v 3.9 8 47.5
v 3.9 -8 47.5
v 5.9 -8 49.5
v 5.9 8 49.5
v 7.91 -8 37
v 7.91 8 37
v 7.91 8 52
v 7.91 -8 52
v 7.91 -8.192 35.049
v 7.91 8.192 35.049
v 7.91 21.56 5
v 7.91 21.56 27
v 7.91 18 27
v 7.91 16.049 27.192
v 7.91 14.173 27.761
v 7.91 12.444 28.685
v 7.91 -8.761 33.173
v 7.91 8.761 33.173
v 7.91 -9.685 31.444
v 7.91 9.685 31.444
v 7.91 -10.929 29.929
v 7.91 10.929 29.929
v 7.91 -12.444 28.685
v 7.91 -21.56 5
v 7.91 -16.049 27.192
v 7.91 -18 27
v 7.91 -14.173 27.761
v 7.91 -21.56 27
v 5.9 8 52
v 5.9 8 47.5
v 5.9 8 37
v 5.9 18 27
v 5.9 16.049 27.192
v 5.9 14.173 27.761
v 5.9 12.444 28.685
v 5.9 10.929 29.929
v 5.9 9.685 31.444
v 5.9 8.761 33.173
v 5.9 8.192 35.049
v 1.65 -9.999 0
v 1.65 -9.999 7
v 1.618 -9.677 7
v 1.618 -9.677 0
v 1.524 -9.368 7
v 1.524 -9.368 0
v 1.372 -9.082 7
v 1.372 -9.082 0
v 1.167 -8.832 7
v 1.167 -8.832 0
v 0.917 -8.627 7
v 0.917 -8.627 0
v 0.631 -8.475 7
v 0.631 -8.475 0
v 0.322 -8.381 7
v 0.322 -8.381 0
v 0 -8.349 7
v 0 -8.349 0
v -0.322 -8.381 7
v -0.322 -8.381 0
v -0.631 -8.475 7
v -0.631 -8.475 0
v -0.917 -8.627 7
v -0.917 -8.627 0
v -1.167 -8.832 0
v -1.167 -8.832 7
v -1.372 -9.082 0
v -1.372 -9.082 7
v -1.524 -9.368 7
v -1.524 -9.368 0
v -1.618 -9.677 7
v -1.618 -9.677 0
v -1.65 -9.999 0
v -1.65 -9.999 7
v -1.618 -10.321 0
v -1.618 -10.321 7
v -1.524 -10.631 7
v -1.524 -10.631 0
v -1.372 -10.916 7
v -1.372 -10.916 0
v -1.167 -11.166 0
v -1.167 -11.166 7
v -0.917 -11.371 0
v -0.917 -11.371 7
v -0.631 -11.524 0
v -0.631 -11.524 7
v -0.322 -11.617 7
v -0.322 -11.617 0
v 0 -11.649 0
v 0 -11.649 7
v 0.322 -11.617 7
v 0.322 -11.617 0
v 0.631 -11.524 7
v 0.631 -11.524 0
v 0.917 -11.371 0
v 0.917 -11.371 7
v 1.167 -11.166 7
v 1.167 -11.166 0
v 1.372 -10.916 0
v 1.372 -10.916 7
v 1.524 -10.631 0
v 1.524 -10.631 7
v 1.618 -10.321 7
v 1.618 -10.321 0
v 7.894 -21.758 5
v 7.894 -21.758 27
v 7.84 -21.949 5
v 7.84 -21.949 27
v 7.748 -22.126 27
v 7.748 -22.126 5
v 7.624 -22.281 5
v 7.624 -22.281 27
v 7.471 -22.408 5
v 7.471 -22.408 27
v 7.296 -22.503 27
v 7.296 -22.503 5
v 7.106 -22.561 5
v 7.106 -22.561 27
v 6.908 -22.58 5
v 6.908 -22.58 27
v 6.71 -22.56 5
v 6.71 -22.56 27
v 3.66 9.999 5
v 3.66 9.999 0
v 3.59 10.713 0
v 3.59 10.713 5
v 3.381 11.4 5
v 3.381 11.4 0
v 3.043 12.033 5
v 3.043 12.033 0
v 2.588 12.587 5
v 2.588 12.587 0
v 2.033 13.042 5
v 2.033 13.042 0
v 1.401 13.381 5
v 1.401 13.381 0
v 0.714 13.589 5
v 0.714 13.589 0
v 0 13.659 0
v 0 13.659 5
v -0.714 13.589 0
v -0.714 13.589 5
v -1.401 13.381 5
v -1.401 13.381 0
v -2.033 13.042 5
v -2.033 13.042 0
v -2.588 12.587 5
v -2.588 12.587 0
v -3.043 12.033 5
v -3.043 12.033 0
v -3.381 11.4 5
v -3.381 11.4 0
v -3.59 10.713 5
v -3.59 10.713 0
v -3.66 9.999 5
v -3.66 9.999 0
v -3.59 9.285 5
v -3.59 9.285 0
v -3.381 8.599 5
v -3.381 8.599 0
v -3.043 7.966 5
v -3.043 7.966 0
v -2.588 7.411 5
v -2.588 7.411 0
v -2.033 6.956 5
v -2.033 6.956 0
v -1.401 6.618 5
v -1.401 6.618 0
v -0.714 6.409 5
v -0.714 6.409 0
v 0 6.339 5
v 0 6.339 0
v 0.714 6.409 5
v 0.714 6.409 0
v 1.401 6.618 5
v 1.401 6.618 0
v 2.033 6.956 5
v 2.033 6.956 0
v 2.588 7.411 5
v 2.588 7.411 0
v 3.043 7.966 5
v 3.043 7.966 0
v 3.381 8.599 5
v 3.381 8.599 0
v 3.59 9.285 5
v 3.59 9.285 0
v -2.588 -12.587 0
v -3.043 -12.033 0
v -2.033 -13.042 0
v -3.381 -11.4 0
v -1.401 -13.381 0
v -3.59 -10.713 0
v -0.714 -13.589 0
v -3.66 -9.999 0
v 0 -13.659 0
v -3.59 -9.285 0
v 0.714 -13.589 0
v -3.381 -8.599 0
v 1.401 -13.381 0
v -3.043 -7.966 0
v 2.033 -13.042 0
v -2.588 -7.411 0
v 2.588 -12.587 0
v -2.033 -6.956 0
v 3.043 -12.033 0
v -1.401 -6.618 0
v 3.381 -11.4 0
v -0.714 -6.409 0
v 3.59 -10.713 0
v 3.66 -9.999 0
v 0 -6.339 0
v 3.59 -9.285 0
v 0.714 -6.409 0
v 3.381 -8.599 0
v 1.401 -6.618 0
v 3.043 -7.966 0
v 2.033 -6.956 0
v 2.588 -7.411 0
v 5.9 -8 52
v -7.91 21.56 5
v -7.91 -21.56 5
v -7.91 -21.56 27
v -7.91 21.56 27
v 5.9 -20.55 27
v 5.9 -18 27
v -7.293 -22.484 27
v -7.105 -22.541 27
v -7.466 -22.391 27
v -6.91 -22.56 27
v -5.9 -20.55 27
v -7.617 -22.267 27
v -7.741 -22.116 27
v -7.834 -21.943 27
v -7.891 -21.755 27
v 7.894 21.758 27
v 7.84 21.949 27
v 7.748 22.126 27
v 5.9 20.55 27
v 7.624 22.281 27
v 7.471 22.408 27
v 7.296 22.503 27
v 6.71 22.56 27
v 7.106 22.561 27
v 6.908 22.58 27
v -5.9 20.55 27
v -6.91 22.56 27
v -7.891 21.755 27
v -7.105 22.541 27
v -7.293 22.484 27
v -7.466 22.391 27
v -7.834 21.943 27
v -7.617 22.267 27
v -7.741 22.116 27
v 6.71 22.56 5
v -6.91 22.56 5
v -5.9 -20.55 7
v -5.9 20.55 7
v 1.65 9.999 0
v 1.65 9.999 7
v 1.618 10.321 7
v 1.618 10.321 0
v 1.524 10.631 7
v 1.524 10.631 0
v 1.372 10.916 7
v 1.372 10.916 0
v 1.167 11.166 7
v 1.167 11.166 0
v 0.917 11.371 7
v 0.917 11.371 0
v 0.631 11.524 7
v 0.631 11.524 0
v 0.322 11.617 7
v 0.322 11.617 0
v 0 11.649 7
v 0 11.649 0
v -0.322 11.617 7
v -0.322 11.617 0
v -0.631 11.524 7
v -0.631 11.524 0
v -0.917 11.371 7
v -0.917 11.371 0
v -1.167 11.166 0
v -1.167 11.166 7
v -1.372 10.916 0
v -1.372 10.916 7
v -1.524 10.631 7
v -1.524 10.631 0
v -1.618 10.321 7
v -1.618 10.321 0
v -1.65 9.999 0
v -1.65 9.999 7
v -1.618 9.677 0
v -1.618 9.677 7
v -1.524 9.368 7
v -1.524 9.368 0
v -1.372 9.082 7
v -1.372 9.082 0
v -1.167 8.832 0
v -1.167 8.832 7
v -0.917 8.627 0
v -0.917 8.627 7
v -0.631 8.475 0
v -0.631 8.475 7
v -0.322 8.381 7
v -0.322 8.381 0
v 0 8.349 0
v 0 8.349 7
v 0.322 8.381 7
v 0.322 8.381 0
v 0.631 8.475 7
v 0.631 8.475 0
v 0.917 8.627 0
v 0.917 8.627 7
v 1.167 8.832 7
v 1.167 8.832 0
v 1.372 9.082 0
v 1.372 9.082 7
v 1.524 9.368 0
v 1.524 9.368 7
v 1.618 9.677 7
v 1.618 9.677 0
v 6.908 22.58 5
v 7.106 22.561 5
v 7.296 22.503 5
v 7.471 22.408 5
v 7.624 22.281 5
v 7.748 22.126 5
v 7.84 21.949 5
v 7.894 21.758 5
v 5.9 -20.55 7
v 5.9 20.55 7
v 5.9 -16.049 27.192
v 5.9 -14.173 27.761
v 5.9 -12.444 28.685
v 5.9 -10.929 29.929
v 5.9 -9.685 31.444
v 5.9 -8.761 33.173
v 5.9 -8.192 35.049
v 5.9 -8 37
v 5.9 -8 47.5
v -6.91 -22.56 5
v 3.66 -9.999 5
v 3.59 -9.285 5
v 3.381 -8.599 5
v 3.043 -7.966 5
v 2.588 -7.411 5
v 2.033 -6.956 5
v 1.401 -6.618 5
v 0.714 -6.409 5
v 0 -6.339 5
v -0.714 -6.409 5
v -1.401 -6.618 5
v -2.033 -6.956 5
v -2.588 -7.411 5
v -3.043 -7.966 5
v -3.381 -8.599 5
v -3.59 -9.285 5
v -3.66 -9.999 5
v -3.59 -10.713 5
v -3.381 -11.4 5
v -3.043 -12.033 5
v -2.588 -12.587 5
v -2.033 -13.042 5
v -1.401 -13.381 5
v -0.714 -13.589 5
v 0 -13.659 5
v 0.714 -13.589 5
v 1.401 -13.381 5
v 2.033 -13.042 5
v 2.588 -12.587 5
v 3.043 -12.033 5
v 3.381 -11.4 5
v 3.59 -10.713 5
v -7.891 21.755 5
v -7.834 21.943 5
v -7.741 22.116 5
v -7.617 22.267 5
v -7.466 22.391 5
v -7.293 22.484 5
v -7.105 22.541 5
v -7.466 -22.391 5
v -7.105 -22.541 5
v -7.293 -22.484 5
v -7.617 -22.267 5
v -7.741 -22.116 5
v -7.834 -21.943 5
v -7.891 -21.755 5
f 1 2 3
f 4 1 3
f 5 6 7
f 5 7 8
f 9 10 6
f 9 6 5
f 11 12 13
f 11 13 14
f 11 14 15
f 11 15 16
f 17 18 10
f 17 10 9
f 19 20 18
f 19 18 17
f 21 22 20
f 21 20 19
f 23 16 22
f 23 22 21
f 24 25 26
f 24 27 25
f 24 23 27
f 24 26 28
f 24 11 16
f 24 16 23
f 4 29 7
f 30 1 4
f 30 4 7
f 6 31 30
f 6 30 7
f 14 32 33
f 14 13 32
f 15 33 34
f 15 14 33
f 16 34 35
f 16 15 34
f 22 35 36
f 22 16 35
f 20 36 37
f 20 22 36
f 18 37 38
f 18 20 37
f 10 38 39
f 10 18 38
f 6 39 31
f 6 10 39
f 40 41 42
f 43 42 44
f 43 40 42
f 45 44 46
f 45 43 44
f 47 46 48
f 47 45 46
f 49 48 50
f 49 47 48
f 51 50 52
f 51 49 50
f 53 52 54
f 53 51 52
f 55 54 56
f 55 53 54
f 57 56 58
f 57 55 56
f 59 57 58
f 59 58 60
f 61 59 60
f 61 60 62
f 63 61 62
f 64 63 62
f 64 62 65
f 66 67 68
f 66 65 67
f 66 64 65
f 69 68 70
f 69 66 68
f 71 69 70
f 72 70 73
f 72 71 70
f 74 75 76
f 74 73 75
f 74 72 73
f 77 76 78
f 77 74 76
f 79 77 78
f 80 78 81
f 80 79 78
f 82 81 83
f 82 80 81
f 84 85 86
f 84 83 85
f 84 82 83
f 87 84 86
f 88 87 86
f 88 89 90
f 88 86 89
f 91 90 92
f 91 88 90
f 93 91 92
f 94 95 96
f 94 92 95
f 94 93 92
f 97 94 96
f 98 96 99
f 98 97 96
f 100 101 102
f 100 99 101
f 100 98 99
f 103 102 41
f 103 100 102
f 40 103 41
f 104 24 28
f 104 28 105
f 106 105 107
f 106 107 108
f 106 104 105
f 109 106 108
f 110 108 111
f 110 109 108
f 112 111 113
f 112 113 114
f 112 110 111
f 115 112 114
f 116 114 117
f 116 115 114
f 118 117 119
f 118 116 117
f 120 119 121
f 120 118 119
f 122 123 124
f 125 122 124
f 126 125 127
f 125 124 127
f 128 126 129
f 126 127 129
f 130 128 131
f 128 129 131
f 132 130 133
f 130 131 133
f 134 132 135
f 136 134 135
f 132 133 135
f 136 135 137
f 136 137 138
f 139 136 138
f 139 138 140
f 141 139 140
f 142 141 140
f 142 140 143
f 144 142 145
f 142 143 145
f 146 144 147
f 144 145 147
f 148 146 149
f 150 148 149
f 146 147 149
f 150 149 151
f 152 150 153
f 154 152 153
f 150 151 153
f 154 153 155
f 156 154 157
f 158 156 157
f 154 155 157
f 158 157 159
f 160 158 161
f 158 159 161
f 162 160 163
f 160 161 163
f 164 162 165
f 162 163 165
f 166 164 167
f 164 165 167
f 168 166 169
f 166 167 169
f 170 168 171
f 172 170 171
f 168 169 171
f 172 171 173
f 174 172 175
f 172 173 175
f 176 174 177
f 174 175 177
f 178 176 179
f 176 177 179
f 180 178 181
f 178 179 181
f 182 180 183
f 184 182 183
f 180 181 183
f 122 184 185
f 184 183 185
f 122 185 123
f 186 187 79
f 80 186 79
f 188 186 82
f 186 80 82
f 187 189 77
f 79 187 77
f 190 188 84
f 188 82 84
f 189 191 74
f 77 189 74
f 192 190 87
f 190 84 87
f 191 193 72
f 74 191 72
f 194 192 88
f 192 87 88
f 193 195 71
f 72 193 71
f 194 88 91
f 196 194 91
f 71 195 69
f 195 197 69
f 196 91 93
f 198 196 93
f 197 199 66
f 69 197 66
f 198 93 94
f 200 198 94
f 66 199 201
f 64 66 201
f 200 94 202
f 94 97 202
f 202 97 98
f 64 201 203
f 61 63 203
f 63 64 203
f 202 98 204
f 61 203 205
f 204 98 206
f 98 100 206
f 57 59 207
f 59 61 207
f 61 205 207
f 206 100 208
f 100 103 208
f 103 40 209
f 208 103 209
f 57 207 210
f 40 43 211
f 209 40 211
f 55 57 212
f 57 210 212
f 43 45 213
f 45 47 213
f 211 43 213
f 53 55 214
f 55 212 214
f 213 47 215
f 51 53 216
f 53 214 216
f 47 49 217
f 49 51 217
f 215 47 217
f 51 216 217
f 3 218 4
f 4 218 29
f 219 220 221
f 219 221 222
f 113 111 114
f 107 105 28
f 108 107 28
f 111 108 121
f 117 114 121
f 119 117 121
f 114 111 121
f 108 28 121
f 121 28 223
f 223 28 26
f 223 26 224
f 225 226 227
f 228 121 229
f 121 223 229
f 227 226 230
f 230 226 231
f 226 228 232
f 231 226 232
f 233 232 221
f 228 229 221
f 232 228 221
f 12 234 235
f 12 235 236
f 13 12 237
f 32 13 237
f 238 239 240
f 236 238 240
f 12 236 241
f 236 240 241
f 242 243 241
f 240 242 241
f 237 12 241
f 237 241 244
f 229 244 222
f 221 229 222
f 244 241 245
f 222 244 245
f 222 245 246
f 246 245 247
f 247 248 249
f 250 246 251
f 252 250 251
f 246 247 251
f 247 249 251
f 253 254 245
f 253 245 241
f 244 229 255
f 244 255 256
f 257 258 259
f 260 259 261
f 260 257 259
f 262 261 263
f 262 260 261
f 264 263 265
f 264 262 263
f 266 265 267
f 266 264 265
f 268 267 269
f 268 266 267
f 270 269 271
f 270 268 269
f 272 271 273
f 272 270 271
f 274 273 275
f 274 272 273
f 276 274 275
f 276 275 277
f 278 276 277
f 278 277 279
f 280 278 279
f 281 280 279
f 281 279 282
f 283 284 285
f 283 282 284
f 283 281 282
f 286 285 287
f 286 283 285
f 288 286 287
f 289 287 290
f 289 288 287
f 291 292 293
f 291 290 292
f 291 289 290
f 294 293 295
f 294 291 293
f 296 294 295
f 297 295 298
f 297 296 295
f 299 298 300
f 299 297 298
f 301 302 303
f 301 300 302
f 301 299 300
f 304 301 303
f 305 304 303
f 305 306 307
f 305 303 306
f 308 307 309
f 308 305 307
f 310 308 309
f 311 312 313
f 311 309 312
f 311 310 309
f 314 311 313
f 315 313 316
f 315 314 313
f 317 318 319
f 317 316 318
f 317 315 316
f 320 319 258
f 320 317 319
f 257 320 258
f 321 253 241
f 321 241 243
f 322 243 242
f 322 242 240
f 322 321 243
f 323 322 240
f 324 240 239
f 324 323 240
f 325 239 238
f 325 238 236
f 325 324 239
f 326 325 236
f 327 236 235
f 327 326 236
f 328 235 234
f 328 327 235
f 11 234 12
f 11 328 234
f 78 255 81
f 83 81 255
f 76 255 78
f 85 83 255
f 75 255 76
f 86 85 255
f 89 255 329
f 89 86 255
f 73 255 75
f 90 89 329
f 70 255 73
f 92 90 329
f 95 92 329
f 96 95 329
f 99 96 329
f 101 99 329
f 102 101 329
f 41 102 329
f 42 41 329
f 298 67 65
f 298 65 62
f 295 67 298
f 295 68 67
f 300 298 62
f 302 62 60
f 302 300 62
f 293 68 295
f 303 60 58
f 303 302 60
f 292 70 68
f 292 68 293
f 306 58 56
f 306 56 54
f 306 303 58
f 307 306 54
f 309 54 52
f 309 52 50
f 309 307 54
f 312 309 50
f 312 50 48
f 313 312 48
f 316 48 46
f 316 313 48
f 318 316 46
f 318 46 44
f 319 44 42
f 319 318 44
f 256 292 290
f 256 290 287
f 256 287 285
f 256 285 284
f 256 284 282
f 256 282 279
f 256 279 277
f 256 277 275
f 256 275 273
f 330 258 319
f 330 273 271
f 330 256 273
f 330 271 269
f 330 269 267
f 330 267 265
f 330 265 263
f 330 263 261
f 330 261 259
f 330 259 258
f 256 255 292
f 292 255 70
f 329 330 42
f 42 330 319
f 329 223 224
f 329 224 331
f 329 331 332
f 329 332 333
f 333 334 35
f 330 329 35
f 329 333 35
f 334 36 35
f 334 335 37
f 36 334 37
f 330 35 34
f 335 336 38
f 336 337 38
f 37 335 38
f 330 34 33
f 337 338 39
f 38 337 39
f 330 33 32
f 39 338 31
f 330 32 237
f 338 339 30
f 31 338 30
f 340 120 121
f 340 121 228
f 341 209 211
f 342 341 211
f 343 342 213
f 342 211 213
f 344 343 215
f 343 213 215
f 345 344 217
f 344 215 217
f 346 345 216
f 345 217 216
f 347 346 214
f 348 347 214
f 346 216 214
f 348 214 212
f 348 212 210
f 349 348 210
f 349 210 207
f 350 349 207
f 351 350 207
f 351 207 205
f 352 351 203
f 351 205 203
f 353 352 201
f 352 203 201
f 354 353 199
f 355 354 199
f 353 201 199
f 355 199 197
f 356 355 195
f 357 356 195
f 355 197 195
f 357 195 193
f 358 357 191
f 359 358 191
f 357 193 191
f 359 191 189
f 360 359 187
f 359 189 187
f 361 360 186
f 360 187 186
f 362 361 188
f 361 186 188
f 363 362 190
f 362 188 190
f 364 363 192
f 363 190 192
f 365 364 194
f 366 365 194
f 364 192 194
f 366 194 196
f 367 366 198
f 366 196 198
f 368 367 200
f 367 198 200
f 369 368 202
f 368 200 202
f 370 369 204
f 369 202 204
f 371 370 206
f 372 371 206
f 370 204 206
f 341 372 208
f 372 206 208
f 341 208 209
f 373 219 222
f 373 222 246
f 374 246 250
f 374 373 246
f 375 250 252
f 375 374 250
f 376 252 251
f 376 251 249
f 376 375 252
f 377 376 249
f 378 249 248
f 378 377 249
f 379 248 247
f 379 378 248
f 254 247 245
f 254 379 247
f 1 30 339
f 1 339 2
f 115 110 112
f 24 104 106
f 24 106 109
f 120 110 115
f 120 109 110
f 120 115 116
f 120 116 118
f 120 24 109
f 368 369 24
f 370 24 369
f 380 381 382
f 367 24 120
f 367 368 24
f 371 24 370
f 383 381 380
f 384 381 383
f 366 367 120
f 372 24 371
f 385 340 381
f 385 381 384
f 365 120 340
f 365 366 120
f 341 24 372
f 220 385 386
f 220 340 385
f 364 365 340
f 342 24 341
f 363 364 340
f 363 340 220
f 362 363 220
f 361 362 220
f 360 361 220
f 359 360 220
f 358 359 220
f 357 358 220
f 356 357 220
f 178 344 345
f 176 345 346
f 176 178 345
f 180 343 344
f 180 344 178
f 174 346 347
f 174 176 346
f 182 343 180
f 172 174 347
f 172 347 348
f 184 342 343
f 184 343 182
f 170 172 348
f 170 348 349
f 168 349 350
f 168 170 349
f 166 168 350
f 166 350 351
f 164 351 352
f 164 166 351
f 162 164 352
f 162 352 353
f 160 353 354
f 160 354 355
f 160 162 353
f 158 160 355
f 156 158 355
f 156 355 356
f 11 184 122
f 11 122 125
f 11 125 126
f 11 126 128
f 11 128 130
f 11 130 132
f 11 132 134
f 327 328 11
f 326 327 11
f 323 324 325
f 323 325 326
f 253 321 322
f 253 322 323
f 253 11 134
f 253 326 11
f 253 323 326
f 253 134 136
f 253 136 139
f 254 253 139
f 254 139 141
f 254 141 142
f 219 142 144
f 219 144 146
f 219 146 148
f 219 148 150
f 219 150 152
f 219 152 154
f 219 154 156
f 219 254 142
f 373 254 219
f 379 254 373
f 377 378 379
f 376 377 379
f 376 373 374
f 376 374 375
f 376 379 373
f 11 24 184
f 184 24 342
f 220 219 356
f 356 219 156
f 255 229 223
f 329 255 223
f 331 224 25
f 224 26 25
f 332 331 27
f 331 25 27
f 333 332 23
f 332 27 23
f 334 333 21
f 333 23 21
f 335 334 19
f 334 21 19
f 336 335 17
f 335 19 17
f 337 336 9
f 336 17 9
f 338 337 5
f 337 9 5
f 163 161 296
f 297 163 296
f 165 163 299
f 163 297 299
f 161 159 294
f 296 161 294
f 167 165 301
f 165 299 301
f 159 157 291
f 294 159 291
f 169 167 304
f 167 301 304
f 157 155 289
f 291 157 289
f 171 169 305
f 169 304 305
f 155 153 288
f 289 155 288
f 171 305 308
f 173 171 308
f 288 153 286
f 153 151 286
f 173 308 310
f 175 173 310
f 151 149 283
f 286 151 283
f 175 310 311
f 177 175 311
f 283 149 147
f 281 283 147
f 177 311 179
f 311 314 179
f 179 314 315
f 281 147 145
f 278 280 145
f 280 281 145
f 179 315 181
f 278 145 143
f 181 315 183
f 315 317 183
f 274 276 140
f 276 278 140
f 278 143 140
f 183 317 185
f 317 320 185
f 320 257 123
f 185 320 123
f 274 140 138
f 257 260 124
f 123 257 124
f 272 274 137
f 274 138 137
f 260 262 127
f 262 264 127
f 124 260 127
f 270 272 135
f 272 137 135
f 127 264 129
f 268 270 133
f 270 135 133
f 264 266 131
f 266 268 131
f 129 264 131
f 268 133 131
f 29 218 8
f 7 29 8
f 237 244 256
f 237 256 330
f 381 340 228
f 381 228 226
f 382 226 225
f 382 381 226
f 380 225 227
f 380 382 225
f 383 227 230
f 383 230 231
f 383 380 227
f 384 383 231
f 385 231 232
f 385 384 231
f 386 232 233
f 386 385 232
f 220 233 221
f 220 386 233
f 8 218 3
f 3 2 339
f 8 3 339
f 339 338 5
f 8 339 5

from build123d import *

# Parameters (mm, degrees)
SKETCH1_R             = 3.66
SKETCH1_R_2           = 1.65
BOSS_EXTRUDE1_DEPTH   = 5
BOSS_EXTRUDE1_2_DEPTH = 5
SKETCH2_R             = 1.65
BOSS_EXTRUDE2_DEPTH   = 22
SKETCH3_W             = 11.8
SKETCH3_H             = 41.1
CUT_EXTRUDE1_DEPTH    = 20
SKETCH4_W             = 2.01
SKETCH4_H             = 16
BOSS_EXTRUDE3_DEPTH   = 25
FILLET1_R             = 10
BOSS_EXTRUDE4_DEPTH   = 16


with BuildPart() as part:
    # Sketch1 → Boss-Extrude1 (new body)
    with BuildSketch(Plane.XY):
        with Locations((0, -9.999161717)):
            Circle(SKETCH1_R)
        with Locations((0, -9.999161717)):
            Circle(SKETCH1_R_2, mode=Mode.SUBTRACT)
    extrude(amount=BOSS_EXTRUDE1_DEPTH)



with BuildPart() as body_2:
    # Sketch1 → Boss-Extrude1 2 (new body)
    with BuildSketch(Plane.XY):
        with Locations((0, 9.999161717)):
            Circle(SKETCH1_R)
        with Locations((0, 9.999161717)):
            Circle(SKETCH1_R_2, mode=Mode.SUBTRACT)
    extrude(amount=BOSS_EXTRUDE1_2_DEPTH)


with BuildPart() as part_1:
    add(part.part)

    add(body_2.part)  # Boss-Extrude2 merges body 2
    # Sketch2 → Boss-Extrude2 (add)
    with BuildSketch(Plane.XY.offset(5)):
        with BuildLine():
            Line((-6.91, 22.56), (6.71, 22.56))
            ThreePointArc((6.71, 22.56), (7.550387634, 22.348468599), (7.91, 21.560004361))
            Line((7.91, 21.560004361), (7.91, -21.560004361))
            ThreePointArc((7.91, -21.560004361), (7.550387634, -22.348468599), (6.71, -22.56))
            Line((6.71, -22.56), (-6.91, -22.56))
            ThreePointArc((-6.91, -22.56), (-7.617106781, -22.267106781), (-7.91, -21.56))
            Line((-7.91, -21.56), (-7.91, 21.56))
            ThreePointArc((-7.91, 21.56), (-7.617106781, 22.267106781), (-6.91, 22.56))
        make_face()
        with Locations((0, 9.999161717)):
            Circle(SKETCH2_R, mode=Mode.SUBTRACT)
        with Locations((0, -9.999161717)):
            Circle(SKETCH2_R, mode=Mode.SUBTRACT)
    extrude(amount=BOSS_EXTRUDE2_DEPTH)

    # Sketch3 → Cut-Extrude1 (cut)
    with BuildSketch(Plane.XY.offset(27)):
        Rectangle(SKETCH3_W, SKETCH3_H)
    extrude(amount=-CUT_EXTRUDE1_DEPTH, mode=Mode.SUBTRACT)

    # Sketch4 → Boss-Extrude3 (add)
    with BuildSketch(Plane.XY.offset(27)):
        with Locations((6.905, 0)):
            Rectangle(SKETCH4_W, SKETCH4_H)
    extrude(amount=BOSS_EXTRUDE3_DEPTH)

    # Fillet1
    fillet1_edges = [part_1.edges().sort_by_distance(p)[0] for p in [
        (6.905, -8, 27),
        (6.905, 8, 27),
    ]]
    fillet(fillet1_edges, radius=FILLET1_R)

    # Sketch5 → Boss-Extrude4 (add)
    with BuildSketch(Plane.XZ.offset(8)):
        Polygon((5.9, 47.5), (3.9, 47.5), (5.9, 49.5), align=None)
    extrude(amount=-BOSS_EXTRUDE4_DEPTH)


solid = part_1.part
